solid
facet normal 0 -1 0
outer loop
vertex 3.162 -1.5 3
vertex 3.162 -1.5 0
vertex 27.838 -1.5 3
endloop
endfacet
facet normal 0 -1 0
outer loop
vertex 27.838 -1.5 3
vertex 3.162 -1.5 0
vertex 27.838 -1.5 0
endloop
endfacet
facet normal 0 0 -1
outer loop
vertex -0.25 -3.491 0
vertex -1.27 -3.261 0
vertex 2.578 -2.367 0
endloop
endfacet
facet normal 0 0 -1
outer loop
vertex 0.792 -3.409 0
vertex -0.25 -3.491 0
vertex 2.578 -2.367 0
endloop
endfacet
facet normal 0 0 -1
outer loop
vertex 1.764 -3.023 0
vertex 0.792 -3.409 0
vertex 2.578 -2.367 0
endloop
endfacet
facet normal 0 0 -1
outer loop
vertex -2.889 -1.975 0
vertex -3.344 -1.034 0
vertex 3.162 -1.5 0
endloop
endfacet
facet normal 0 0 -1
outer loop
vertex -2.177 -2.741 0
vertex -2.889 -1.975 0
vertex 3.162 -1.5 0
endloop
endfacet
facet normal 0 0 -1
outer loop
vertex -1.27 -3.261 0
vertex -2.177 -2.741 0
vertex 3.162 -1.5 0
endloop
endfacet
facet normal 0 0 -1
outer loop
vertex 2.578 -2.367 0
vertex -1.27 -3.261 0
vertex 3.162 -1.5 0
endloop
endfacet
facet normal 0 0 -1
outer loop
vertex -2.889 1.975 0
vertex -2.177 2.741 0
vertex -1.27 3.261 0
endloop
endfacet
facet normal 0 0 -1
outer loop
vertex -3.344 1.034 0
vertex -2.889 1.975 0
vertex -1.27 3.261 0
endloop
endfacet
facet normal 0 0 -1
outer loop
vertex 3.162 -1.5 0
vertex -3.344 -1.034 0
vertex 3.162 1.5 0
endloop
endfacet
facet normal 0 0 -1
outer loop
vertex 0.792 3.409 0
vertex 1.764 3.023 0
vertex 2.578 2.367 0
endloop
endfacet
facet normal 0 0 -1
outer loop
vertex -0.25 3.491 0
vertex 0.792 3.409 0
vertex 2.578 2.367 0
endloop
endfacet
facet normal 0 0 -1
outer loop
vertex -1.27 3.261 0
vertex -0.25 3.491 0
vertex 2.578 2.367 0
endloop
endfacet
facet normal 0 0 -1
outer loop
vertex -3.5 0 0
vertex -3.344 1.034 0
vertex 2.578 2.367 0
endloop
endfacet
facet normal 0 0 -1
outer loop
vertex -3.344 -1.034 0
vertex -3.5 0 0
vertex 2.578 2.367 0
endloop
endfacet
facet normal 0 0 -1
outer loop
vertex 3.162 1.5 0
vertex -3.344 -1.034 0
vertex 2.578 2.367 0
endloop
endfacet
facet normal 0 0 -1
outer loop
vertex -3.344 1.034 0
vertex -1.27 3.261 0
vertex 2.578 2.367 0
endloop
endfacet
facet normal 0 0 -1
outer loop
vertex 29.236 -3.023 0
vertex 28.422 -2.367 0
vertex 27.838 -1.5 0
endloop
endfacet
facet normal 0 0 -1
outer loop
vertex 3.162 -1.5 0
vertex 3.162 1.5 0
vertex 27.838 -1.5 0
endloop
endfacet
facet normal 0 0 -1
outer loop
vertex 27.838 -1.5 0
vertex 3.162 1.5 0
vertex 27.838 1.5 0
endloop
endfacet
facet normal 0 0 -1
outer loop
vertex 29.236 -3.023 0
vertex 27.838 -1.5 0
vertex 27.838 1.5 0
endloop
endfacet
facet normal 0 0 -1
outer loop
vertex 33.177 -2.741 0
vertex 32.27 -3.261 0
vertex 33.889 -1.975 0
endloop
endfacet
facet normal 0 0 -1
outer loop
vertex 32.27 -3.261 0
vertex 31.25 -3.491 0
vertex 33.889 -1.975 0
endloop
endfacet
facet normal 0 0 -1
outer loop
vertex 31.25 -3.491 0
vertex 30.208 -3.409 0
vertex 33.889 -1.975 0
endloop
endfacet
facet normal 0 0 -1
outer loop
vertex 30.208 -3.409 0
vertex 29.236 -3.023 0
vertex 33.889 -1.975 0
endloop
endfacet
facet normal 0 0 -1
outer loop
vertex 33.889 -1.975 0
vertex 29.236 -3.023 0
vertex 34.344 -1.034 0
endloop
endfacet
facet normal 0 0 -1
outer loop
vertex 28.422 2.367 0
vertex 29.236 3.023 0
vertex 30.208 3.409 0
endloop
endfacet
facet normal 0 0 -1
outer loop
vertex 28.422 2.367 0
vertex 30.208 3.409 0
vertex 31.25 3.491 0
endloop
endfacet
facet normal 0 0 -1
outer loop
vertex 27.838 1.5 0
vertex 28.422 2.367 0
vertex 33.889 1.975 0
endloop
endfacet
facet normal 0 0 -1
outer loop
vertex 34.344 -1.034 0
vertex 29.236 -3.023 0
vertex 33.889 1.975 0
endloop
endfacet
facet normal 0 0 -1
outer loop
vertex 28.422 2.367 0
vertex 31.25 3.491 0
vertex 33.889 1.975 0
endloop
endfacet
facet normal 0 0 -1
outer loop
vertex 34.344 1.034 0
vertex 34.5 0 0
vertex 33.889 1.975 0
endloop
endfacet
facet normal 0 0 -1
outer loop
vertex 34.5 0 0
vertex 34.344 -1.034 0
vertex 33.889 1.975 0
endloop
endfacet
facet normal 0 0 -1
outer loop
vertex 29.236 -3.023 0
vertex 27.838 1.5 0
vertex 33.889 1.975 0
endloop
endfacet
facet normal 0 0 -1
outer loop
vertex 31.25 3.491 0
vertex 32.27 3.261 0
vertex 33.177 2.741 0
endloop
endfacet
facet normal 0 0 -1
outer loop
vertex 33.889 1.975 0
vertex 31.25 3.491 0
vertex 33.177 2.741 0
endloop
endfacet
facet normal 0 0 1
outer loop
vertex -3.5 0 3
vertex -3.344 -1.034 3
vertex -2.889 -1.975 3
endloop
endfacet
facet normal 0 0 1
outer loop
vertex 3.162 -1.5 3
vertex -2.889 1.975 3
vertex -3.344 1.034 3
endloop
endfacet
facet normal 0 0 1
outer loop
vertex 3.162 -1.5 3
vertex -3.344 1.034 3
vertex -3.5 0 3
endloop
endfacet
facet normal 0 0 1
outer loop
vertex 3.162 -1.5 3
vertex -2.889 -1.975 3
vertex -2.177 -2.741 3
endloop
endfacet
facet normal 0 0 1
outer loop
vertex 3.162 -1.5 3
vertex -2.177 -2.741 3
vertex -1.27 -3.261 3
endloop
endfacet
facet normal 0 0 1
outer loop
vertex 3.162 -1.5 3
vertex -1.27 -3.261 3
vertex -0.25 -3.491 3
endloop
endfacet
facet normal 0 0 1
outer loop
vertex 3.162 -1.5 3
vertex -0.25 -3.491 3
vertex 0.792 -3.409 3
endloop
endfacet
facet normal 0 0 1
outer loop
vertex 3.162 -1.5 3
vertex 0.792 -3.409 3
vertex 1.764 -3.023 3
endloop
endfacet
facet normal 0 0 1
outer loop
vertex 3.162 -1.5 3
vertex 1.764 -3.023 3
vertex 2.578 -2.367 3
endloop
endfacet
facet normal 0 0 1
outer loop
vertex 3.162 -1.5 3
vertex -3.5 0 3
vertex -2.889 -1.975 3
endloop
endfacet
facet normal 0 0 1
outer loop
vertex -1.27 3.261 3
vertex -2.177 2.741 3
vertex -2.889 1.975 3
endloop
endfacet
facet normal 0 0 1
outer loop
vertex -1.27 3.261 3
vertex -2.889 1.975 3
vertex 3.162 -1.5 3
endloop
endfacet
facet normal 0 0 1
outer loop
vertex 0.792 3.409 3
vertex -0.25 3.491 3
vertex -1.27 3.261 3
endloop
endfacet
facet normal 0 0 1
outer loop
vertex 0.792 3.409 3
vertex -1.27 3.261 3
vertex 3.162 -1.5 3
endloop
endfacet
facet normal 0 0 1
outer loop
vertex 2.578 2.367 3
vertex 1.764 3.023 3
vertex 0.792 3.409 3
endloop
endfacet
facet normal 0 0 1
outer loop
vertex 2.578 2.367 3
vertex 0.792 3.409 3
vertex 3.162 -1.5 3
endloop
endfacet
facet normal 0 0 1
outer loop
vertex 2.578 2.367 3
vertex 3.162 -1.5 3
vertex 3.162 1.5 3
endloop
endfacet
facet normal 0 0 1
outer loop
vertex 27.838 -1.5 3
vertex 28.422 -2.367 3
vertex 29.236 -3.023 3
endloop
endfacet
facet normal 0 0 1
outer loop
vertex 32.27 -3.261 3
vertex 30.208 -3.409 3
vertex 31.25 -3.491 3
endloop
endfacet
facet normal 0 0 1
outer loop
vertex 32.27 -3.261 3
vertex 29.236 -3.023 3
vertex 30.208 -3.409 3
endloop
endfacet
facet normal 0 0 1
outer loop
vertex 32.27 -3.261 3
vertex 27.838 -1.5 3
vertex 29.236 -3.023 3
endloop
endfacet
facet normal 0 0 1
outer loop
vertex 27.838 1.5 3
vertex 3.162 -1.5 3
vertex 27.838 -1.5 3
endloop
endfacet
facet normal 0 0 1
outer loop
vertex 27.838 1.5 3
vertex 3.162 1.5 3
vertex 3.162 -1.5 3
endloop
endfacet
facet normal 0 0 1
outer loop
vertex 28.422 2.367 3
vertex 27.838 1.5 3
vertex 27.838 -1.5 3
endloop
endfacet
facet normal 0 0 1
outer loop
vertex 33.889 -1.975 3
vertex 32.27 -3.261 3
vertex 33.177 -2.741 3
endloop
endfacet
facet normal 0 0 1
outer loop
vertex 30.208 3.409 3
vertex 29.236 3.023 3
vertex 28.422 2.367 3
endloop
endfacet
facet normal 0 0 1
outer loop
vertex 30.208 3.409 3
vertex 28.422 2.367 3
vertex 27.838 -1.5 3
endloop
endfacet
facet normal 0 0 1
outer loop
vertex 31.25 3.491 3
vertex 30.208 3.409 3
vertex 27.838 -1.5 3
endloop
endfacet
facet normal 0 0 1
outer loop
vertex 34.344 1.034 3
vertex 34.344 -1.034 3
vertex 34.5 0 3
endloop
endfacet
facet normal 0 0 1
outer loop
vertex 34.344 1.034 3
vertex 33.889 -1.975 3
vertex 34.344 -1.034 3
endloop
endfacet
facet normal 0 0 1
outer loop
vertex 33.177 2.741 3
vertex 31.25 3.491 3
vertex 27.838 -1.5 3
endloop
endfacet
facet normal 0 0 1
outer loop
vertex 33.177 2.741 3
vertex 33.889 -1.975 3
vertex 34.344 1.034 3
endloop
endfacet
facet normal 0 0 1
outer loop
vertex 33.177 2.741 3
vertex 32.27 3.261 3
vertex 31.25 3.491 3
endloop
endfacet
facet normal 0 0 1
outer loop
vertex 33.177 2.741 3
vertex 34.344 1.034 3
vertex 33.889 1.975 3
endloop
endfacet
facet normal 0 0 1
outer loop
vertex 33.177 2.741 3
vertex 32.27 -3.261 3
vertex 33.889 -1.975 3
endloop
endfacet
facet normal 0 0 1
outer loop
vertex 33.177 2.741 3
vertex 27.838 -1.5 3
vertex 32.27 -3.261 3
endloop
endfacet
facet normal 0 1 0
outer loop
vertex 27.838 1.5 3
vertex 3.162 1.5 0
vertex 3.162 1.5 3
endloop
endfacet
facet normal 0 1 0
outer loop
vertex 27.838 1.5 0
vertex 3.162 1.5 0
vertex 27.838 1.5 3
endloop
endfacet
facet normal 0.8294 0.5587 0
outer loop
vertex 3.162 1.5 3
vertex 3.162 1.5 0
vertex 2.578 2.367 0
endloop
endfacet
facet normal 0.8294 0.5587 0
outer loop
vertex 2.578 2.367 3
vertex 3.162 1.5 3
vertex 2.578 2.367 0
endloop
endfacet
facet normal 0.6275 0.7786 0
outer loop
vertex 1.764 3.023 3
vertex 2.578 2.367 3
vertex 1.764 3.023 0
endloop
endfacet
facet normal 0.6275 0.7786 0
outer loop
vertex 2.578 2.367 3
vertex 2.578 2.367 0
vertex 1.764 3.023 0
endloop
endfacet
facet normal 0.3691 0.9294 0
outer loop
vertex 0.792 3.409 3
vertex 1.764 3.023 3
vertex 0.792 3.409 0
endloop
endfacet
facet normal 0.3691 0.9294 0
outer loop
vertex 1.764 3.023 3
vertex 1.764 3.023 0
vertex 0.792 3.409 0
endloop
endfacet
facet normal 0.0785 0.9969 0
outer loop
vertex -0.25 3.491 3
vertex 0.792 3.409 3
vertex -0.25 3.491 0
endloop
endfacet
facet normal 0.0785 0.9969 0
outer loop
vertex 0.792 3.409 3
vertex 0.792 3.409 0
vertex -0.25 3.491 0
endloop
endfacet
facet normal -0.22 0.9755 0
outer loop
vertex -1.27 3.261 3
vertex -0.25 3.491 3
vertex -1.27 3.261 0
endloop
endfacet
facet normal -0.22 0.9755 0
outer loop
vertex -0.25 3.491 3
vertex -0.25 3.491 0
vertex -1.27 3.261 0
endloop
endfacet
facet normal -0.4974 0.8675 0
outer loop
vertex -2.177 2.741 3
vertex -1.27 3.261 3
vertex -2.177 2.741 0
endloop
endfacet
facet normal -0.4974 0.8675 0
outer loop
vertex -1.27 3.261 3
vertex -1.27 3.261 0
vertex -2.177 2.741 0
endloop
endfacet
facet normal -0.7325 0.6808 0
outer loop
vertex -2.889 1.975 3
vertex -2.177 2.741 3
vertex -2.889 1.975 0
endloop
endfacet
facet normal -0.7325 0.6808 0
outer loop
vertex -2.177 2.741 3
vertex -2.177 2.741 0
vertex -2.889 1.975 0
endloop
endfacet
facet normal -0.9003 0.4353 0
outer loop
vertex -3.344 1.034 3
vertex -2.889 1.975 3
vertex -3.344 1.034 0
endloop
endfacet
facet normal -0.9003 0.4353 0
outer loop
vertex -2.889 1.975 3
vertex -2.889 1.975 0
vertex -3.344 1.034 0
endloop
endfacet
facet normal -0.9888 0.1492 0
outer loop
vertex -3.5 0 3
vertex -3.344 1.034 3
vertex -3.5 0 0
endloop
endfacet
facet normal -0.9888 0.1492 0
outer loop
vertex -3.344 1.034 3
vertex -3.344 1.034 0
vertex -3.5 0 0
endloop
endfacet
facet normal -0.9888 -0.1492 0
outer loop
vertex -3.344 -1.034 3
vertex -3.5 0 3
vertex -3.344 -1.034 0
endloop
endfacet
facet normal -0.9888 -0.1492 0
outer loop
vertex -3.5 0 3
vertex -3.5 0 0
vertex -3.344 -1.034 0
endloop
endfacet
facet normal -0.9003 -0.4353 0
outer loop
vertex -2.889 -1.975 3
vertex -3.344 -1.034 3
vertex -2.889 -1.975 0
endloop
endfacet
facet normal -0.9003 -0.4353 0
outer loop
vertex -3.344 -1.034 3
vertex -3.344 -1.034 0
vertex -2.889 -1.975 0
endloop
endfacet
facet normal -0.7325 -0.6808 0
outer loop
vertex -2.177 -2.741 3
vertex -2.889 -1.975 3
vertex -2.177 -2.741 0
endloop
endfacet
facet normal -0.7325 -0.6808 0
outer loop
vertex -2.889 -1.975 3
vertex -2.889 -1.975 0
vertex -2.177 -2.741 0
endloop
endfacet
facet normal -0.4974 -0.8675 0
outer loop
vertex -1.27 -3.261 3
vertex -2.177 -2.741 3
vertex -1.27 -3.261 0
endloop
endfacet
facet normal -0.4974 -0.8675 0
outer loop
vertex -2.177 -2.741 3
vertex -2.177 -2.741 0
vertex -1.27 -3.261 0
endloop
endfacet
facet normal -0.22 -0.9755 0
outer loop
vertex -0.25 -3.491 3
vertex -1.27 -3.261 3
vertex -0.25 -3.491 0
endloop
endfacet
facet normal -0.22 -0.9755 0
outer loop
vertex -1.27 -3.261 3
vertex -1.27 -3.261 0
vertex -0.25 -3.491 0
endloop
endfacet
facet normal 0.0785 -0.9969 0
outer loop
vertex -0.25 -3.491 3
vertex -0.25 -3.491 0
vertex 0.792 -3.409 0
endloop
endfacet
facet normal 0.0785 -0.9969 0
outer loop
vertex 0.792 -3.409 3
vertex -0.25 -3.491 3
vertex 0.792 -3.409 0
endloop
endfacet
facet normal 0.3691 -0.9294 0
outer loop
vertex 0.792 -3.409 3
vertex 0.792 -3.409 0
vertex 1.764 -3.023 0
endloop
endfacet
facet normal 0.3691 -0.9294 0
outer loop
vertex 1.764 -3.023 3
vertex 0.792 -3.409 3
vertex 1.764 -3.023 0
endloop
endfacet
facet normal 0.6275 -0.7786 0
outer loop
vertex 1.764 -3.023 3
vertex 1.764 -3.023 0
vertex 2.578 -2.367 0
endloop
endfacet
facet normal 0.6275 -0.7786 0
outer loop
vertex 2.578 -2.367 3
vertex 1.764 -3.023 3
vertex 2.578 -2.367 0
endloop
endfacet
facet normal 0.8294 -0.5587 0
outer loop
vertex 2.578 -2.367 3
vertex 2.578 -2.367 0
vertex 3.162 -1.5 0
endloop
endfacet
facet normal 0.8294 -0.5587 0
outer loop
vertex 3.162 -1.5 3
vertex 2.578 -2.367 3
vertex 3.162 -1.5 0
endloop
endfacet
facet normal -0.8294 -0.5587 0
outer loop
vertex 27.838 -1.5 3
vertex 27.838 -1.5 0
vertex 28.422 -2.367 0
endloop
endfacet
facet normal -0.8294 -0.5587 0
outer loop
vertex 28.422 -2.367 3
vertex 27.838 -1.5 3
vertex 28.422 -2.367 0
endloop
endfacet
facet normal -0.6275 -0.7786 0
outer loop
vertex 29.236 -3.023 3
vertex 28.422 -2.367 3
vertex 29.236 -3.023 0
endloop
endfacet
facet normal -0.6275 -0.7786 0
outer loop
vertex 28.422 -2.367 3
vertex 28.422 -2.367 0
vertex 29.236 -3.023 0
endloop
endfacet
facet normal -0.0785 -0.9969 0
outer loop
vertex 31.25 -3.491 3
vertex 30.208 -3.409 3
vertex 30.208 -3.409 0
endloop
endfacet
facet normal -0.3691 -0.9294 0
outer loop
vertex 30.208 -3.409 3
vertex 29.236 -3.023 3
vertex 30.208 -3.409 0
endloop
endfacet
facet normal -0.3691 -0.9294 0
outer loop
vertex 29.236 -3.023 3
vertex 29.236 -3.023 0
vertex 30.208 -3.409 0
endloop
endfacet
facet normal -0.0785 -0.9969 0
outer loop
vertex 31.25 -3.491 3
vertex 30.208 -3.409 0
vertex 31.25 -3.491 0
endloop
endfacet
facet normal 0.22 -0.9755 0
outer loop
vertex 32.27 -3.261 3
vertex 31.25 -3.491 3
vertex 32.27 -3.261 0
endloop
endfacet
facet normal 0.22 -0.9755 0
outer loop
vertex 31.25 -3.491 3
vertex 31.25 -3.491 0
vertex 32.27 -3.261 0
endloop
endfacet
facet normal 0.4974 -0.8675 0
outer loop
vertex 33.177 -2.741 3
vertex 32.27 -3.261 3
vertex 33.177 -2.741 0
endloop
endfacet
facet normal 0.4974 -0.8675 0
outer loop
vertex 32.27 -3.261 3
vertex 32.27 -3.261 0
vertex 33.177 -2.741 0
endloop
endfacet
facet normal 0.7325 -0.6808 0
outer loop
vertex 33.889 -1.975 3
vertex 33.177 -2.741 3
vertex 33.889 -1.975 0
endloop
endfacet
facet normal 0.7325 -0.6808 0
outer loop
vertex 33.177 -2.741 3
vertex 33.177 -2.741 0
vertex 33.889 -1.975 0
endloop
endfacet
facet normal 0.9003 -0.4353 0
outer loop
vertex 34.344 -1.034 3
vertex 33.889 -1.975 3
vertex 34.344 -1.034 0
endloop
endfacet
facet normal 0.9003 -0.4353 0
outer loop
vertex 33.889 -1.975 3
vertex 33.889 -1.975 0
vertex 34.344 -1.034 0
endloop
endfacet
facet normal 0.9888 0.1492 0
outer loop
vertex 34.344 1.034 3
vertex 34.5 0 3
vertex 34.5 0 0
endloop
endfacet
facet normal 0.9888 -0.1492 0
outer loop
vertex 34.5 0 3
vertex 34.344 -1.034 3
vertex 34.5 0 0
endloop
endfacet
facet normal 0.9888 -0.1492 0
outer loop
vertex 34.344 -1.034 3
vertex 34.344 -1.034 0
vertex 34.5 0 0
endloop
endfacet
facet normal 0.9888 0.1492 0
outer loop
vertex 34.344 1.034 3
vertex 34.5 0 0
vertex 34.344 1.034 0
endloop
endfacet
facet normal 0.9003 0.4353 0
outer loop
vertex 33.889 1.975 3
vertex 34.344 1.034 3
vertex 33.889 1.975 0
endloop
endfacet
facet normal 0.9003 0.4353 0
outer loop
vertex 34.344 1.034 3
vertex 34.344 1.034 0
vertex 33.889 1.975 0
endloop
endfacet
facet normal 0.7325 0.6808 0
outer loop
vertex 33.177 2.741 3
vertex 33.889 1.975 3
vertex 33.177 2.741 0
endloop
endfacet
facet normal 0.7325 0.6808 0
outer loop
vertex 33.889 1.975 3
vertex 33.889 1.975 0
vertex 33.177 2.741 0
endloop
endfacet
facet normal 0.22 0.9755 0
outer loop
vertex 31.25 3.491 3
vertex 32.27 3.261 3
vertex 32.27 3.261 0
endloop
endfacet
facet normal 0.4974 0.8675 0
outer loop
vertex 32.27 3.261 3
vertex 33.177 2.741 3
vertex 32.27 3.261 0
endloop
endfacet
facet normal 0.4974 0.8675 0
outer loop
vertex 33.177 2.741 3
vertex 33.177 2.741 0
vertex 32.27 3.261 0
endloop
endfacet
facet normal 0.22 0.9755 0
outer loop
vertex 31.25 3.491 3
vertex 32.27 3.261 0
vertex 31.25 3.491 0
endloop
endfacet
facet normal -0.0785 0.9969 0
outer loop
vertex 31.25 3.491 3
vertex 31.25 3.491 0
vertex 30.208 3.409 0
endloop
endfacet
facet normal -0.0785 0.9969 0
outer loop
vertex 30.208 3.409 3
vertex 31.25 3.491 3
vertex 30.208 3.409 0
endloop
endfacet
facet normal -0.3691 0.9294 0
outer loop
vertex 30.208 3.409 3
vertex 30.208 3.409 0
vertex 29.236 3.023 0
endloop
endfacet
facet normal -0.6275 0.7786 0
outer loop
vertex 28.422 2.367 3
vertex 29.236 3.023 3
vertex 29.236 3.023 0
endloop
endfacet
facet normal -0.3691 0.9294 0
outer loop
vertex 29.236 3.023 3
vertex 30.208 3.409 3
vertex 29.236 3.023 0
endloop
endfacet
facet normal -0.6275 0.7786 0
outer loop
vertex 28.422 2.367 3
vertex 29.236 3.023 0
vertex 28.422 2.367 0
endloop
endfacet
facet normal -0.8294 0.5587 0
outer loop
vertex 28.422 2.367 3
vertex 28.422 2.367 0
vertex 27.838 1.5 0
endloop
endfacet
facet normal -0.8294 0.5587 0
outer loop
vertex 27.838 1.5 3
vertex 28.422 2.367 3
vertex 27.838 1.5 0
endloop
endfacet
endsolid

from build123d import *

# Parameters (mm, degrees)
SKETCH1_R           = 3.5
BOSS_EXTRUDE1_DEPTH = 3
SKETCH2_R           = 3.5
BOSS_EXTRUDE2_DEPTH = 3
SKETCH3_W           = 31
SKETCH3_H           = 3
BOSS_EXTRUDE3_DEPTH = 3


with BuildPart() as part:
    # Sketch1 → Boss-Extrude1 (new body)
    with BuildSketch(Plane.XY):
        Circle(SKETCH1_R)
    extrude(amount=BOSS_EXTRUDE1_DEPTH)



with BuildPart() as body_2:
    # Sketch2 → Boss-Extrude2 (new body)
    with BuildSketch(Plane.XY):
        with Locations((31, 0)):
            Circle(SKETCH2_R)
    extrude(amount=BOSS_EXTRUDE2_DEPTH)


with BuildPart() as part_1:
    add(part.part)

    add(body_2.part)  # Boss-Extrude3 merges body 2
    # Sketch3 → Boss-Extrude3 (add)
    with BuildSketch(Plane.XY):
        with Locations((15.5, 0)):
            Rectangle(SKETCH3_W, SKETCH3_H)
    extrude(amount=BOSS_EXTRUDE3_DEPTH)


solid = part_1.part
